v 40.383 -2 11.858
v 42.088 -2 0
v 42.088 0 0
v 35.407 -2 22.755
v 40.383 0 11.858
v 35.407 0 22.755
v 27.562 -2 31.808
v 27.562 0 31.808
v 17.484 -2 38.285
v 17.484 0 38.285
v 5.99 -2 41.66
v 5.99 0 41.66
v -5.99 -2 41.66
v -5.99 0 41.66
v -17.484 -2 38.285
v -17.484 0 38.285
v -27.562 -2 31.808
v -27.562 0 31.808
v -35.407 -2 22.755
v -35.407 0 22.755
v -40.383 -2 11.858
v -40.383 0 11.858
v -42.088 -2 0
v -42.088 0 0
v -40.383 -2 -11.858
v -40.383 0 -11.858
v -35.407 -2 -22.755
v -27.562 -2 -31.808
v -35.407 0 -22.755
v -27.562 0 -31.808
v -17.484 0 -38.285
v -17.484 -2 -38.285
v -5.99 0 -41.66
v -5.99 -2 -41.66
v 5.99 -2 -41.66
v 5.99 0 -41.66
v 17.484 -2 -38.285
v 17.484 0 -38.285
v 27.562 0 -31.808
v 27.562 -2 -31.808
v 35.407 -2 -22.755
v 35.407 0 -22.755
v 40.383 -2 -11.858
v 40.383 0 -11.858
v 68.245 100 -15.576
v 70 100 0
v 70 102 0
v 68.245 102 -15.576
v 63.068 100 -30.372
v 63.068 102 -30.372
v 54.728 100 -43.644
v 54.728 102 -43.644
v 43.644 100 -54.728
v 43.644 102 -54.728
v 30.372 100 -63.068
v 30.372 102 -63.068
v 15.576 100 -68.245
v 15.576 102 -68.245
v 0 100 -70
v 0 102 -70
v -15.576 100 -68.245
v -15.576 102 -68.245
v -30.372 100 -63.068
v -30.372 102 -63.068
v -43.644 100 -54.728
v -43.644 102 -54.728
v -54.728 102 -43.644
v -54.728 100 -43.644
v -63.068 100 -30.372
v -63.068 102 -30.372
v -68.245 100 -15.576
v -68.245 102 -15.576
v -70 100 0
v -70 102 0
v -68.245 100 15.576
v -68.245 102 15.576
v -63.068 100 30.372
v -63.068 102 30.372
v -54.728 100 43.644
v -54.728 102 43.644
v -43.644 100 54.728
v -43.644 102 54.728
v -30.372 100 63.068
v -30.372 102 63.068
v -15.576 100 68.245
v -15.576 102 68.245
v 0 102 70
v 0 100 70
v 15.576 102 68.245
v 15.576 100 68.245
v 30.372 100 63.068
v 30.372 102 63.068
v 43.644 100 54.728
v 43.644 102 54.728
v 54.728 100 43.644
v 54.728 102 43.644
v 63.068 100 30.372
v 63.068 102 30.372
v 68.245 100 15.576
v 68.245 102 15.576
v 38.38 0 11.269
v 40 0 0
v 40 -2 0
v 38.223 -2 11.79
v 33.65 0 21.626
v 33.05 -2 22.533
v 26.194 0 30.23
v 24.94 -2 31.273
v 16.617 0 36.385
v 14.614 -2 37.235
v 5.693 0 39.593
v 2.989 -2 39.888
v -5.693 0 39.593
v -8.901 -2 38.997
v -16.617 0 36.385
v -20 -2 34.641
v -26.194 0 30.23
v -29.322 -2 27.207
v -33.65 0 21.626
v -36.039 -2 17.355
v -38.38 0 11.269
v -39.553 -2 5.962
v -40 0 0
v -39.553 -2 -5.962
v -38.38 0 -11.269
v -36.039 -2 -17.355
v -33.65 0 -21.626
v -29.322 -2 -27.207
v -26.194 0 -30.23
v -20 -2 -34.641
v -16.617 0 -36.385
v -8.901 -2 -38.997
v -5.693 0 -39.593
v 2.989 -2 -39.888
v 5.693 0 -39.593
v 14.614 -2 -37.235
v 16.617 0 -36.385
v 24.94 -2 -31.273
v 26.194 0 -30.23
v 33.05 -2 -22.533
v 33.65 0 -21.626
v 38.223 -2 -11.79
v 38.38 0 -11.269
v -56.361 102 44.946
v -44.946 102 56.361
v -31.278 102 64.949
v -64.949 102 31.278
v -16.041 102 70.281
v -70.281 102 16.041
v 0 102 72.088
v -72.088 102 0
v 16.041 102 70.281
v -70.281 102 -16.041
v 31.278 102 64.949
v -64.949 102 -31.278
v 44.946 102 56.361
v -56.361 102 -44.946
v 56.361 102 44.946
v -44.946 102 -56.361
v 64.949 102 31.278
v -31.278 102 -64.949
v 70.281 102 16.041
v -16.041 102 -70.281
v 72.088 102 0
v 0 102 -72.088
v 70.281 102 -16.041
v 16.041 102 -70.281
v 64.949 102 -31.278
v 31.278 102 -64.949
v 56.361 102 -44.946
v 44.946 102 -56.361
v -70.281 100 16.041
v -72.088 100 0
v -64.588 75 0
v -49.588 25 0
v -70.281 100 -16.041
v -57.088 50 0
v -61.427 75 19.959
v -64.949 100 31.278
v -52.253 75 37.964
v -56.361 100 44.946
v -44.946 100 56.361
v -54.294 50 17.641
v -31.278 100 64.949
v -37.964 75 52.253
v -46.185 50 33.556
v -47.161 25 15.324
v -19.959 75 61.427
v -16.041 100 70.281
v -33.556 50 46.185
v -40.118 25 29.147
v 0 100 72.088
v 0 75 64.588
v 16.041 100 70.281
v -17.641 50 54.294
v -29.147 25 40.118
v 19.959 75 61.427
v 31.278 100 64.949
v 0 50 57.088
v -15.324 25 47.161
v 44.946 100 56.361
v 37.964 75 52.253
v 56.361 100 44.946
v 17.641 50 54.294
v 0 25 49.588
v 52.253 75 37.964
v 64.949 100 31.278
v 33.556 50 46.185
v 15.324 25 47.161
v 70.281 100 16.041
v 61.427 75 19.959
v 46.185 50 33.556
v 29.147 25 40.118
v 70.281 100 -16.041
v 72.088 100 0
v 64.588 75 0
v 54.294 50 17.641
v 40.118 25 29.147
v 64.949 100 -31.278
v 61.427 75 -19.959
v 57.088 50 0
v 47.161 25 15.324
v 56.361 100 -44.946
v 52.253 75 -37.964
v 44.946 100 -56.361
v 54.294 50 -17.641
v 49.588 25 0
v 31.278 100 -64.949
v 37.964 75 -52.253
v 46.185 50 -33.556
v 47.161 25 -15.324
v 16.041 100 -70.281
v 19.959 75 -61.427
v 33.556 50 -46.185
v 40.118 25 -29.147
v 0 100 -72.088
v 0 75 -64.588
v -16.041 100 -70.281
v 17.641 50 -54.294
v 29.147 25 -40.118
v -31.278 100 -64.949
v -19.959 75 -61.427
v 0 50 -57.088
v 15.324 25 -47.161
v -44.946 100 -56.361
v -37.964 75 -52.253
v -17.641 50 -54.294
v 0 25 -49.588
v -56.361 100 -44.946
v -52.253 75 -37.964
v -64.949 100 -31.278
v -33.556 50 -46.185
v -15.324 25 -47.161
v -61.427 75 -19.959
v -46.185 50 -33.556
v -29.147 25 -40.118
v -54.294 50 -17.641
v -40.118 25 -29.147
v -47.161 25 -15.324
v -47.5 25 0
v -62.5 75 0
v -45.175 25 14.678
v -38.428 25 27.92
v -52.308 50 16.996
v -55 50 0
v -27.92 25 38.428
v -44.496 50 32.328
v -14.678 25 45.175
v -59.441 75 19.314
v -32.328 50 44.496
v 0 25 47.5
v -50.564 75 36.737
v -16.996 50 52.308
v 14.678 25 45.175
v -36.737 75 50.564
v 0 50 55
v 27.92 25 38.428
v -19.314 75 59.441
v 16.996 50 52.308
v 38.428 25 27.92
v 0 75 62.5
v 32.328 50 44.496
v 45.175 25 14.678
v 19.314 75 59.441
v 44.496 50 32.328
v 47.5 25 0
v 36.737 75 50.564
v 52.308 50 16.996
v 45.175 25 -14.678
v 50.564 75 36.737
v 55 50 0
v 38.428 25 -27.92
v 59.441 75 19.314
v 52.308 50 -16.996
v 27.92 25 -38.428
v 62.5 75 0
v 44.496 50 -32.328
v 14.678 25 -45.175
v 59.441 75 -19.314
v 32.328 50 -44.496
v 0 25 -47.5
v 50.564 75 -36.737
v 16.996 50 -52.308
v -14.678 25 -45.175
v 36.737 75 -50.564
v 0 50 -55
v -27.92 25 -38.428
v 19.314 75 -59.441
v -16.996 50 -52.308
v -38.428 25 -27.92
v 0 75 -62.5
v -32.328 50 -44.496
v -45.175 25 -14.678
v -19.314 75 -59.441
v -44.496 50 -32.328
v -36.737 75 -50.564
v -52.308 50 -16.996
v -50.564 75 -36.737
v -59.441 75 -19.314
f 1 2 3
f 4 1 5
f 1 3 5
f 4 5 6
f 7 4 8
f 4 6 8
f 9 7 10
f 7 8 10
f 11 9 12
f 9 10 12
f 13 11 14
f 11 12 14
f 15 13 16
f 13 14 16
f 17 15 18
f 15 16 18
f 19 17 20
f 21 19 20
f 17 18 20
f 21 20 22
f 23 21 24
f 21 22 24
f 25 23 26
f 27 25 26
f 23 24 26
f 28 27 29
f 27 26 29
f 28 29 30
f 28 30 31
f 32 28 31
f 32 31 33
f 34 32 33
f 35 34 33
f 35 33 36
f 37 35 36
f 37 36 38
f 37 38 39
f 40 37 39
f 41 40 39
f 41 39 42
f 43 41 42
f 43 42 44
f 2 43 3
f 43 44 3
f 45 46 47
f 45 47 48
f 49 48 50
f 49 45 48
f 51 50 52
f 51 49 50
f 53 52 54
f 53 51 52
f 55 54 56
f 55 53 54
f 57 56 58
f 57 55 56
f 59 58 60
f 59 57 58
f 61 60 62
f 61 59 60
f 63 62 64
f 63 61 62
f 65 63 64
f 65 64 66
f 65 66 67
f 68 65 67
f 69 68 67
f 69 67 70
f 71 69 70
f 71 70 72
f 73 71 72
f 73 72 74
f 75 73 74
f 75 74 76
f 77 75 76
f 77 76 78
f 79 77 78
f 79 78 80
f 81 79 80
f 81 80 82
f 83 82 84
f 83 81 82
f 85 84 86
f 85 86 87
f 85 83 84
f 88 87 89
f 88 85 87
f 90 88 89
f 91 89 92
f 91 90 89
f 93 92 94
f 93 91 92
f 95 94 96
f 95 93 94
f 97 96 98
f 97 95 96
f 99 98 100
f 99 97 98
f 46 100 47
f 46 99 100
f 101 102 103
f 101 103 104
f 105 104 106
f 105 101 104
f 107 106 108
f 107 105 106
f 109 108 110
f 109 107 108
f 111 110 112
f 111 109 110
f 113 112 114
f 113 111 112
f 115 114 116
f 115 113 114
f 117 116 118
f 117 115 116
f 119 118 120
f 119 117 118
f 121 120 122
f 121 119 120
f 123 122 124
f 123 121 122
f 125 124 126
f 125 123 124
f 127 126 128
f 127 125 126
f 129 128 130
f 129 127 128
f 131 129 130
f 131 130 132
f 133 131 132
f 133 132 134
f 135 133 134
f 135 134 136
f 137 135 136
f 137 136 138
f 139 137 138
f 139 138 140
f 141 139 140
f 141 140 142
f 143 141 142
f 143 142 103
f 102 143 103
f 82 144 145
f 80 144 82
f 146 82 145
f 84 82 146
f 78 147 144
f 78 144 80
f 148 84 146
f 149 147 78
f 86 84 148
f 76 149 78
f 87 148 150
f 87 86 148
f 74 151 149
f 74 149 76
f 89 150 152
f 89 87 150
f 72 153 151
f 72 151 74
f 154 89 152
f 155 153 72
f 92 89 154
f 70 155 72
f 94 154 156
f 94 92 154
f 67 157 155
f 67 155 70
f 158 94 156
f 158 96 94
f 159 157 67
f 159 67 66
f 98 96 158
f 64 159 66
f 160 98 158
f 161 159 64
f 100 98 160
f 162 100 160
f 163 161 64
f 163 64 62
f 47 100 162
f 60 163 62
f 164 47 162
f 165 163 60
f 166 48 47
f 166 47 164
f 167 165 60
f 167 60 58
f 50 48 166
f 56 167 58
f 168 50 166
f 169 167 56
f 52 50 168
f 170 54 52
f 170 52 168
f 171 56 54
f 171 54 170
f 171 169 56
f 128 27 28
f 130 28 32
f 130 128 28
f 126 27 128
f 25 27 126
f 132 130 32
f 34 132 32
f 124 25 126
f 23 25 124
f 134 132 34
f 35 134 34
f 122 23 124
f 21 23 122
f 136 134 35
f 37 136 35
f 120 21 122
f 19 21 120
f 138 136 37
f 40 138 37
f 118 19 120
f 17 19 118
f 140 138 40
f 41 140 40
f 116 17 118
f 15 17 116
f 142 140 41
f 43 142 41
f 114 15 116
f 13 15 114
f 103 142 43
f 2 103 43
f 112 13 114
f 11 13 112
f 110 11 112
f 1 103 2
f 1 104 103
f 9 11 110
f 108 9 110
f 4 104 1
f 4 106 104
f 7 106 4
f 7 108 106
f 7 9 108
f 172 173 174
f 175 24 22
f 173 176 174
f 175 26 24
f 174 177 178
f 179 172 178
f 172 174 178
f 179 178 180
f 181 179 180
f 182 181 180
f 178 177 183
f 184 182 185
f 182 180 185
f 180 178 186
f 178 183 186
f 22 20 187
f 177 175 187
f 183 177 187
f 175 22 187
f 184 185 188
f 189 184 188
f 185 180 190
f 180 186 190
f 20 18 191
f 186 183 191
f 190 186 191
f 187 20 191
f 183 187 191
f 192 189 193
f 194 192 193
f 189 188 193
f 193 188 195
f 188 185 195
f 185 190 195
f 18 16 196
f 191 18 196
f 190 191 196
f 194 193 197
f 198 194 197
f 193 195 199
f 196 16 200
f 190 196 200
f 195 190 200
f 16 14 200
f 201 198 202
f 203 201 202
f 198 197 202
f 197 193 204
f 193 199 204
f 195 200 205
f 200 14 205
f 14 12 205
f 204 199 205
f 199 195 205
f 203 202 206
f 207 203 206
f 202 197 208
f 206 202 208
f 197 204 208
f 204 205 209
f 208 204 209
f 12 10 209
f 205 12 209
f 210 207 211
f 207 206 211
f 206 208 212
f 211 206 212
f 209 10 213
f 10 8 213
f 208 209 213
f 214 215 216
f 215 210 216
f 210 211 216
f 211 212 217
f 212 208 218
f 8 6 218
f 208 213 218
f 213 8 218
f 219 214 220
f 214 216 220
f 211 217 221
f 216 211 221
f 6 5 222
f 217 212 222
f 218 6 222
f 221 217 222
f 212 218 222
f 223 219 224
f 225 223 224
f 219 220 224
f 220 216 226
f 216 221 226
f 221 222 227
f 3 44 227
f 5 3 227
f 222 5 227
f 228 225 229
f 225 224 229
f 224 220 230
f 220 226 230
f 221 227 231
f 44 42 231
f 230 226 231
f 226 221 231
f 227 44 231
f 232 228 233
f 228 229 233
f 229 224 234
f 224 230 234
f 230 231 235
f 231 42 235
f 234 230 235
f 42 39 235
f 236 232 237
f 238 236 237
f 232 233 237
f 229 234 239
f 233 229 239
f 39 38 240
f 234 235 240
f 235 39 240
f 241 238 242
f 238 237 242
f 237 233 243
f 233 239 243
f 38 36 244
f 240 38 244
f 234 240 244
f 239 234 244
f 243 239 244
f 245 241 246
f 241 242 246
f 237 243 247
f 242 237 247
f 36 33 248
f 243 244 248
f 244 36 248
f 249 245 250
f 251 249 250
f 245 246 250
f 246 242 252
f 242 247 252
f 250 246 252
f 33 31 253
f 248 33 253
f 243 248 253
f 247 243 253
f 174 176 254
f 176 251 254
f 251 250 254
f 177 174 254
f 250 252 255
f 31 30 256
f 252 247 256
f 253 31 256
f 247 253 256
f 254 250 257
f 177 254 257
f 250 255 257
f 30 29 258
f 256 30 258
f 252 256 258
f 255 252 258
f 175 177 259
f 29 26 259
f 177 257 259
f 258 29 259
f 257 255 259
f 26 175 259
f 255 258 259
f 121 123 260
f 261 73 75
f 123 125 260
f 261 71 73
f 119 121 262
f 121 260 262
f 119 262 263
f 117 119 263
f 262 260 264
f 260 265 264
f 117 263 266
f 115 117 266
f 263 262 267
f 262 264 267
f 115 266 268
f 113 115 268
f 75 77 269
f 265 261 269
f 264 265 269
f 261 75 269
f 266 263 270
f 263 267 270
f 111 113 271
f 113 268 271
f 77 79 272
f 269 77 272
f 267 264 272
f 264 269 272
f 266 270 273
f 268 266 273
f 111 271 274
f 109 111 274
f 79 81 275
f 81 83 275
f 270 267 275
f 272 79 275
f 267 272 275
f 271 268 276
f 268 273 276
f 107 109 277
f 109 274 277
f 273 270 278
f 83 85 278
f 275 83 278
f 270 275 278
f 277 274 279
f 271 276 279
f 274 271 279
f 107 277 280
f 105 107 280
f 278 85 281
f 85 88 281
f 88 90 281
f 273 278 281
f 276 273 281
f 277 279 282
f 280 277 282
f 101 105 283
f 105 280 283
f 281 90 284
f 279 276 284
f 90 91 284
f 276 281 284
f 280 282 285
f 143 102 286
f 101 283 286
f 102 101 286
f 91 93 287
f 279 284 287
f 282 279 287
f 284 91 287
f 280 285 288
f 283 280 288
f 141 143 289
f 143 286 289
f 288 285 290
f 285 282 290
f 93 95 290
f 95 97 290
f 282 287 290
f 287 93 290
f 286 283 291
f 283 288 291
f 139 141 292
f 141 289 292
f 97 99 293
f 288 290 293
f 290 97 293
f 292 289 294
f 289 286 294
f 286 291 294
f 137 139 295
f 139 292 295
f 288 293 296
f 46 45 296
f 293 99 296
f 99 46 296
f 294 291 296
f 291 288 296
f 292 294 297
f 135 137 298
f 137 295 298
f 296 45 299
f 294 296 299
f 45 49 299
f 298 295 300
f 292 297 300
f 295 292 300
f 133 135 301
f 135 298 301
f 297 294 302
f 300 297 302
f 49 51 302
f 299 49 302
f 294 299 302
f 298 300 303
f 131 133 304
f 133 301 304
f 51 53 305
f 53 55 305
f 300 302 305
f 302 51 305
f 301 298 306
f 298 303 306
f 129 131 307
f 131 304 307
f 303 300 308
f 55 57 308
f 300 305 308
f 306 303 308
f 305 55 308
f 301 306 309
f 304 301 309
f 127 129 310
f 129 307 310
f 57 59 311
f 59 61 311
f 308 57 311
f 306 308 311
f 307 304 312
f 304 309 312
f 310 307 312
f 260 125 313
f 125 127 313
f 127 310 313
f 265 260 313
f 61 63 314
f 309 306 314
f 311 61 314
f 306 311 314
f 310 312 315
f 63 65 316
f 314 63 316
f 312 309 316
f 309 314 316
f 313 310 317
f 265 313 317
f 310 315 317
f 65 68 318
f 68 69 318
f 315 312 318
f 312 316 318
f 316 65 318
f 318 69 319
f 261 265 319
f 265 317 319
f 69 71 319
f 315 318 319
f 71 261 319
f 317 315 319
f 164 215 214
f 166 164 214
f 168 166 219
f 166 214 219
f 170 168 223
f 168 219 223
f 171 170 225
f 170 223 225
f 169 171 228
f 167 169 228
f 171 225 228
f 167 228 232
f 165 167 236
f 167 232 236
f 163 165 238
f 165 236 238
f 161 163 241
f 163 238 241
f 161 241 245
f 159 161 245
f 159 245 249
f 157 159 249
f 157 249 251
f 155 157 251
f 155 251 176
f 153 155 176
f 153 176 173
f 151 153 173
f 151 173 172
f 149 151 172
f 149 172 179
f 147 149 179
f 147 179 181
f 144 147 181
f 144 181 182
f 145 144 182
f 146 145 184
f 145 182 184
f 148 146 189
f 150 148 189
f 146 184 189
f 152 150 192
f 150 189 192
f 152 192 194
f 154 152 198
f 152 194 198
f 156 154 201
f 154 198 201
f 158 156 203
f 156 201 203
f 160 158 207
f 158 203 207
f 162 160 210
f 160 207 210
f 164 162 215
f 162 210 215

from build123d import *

# Parameters (mm, degrees)
SKETCH2_R           = 42.088061302
SKETCH2_R_2         = 40
BOSS_EXTRUDE1_DEPTH = 2
SKETCH3_R           = 72.088061302
SKETCH3_R_2         = 70
BOSS_EXTRUDE2_DEPTH = 2


with BuildPart() as part:
    # Sketch1 → Revolve1 (revolve)
    with BuildSketch(Plane.XY):
        Polygon((-40, 0), (-70, 100), (-72.088061302, 100), (-42.088061302, 0), align=None)
    revolve(axis=Axis((0, 0, 0), (0, 1, 0)))

    # Sketch2 → Boss-Extrude1 (add)
    with BuildSketch(Plane.XZ):
        Circle(SKETCH2_R)
        Circle(SKETCH2_R_2, mode=Mode.SUBTRACT)
    extrude(amount=BOSS_EXTRUDE1_DEPTH)

    # Sketch3 → Boss-Extrude2 (add)
    with BuildSketch(Plane(origin=(0, 100, 0), x_dir=(1, 0, 0), z_dir=(0, 1, 0))):
        Circle(SKETCH3_R)
        Circle(SKETCH3_R_2, mode=Mode.SUBTRACT)
    extrude(amount=BOSS_EXTRUDE2_DEPTH)


solid = part.part
